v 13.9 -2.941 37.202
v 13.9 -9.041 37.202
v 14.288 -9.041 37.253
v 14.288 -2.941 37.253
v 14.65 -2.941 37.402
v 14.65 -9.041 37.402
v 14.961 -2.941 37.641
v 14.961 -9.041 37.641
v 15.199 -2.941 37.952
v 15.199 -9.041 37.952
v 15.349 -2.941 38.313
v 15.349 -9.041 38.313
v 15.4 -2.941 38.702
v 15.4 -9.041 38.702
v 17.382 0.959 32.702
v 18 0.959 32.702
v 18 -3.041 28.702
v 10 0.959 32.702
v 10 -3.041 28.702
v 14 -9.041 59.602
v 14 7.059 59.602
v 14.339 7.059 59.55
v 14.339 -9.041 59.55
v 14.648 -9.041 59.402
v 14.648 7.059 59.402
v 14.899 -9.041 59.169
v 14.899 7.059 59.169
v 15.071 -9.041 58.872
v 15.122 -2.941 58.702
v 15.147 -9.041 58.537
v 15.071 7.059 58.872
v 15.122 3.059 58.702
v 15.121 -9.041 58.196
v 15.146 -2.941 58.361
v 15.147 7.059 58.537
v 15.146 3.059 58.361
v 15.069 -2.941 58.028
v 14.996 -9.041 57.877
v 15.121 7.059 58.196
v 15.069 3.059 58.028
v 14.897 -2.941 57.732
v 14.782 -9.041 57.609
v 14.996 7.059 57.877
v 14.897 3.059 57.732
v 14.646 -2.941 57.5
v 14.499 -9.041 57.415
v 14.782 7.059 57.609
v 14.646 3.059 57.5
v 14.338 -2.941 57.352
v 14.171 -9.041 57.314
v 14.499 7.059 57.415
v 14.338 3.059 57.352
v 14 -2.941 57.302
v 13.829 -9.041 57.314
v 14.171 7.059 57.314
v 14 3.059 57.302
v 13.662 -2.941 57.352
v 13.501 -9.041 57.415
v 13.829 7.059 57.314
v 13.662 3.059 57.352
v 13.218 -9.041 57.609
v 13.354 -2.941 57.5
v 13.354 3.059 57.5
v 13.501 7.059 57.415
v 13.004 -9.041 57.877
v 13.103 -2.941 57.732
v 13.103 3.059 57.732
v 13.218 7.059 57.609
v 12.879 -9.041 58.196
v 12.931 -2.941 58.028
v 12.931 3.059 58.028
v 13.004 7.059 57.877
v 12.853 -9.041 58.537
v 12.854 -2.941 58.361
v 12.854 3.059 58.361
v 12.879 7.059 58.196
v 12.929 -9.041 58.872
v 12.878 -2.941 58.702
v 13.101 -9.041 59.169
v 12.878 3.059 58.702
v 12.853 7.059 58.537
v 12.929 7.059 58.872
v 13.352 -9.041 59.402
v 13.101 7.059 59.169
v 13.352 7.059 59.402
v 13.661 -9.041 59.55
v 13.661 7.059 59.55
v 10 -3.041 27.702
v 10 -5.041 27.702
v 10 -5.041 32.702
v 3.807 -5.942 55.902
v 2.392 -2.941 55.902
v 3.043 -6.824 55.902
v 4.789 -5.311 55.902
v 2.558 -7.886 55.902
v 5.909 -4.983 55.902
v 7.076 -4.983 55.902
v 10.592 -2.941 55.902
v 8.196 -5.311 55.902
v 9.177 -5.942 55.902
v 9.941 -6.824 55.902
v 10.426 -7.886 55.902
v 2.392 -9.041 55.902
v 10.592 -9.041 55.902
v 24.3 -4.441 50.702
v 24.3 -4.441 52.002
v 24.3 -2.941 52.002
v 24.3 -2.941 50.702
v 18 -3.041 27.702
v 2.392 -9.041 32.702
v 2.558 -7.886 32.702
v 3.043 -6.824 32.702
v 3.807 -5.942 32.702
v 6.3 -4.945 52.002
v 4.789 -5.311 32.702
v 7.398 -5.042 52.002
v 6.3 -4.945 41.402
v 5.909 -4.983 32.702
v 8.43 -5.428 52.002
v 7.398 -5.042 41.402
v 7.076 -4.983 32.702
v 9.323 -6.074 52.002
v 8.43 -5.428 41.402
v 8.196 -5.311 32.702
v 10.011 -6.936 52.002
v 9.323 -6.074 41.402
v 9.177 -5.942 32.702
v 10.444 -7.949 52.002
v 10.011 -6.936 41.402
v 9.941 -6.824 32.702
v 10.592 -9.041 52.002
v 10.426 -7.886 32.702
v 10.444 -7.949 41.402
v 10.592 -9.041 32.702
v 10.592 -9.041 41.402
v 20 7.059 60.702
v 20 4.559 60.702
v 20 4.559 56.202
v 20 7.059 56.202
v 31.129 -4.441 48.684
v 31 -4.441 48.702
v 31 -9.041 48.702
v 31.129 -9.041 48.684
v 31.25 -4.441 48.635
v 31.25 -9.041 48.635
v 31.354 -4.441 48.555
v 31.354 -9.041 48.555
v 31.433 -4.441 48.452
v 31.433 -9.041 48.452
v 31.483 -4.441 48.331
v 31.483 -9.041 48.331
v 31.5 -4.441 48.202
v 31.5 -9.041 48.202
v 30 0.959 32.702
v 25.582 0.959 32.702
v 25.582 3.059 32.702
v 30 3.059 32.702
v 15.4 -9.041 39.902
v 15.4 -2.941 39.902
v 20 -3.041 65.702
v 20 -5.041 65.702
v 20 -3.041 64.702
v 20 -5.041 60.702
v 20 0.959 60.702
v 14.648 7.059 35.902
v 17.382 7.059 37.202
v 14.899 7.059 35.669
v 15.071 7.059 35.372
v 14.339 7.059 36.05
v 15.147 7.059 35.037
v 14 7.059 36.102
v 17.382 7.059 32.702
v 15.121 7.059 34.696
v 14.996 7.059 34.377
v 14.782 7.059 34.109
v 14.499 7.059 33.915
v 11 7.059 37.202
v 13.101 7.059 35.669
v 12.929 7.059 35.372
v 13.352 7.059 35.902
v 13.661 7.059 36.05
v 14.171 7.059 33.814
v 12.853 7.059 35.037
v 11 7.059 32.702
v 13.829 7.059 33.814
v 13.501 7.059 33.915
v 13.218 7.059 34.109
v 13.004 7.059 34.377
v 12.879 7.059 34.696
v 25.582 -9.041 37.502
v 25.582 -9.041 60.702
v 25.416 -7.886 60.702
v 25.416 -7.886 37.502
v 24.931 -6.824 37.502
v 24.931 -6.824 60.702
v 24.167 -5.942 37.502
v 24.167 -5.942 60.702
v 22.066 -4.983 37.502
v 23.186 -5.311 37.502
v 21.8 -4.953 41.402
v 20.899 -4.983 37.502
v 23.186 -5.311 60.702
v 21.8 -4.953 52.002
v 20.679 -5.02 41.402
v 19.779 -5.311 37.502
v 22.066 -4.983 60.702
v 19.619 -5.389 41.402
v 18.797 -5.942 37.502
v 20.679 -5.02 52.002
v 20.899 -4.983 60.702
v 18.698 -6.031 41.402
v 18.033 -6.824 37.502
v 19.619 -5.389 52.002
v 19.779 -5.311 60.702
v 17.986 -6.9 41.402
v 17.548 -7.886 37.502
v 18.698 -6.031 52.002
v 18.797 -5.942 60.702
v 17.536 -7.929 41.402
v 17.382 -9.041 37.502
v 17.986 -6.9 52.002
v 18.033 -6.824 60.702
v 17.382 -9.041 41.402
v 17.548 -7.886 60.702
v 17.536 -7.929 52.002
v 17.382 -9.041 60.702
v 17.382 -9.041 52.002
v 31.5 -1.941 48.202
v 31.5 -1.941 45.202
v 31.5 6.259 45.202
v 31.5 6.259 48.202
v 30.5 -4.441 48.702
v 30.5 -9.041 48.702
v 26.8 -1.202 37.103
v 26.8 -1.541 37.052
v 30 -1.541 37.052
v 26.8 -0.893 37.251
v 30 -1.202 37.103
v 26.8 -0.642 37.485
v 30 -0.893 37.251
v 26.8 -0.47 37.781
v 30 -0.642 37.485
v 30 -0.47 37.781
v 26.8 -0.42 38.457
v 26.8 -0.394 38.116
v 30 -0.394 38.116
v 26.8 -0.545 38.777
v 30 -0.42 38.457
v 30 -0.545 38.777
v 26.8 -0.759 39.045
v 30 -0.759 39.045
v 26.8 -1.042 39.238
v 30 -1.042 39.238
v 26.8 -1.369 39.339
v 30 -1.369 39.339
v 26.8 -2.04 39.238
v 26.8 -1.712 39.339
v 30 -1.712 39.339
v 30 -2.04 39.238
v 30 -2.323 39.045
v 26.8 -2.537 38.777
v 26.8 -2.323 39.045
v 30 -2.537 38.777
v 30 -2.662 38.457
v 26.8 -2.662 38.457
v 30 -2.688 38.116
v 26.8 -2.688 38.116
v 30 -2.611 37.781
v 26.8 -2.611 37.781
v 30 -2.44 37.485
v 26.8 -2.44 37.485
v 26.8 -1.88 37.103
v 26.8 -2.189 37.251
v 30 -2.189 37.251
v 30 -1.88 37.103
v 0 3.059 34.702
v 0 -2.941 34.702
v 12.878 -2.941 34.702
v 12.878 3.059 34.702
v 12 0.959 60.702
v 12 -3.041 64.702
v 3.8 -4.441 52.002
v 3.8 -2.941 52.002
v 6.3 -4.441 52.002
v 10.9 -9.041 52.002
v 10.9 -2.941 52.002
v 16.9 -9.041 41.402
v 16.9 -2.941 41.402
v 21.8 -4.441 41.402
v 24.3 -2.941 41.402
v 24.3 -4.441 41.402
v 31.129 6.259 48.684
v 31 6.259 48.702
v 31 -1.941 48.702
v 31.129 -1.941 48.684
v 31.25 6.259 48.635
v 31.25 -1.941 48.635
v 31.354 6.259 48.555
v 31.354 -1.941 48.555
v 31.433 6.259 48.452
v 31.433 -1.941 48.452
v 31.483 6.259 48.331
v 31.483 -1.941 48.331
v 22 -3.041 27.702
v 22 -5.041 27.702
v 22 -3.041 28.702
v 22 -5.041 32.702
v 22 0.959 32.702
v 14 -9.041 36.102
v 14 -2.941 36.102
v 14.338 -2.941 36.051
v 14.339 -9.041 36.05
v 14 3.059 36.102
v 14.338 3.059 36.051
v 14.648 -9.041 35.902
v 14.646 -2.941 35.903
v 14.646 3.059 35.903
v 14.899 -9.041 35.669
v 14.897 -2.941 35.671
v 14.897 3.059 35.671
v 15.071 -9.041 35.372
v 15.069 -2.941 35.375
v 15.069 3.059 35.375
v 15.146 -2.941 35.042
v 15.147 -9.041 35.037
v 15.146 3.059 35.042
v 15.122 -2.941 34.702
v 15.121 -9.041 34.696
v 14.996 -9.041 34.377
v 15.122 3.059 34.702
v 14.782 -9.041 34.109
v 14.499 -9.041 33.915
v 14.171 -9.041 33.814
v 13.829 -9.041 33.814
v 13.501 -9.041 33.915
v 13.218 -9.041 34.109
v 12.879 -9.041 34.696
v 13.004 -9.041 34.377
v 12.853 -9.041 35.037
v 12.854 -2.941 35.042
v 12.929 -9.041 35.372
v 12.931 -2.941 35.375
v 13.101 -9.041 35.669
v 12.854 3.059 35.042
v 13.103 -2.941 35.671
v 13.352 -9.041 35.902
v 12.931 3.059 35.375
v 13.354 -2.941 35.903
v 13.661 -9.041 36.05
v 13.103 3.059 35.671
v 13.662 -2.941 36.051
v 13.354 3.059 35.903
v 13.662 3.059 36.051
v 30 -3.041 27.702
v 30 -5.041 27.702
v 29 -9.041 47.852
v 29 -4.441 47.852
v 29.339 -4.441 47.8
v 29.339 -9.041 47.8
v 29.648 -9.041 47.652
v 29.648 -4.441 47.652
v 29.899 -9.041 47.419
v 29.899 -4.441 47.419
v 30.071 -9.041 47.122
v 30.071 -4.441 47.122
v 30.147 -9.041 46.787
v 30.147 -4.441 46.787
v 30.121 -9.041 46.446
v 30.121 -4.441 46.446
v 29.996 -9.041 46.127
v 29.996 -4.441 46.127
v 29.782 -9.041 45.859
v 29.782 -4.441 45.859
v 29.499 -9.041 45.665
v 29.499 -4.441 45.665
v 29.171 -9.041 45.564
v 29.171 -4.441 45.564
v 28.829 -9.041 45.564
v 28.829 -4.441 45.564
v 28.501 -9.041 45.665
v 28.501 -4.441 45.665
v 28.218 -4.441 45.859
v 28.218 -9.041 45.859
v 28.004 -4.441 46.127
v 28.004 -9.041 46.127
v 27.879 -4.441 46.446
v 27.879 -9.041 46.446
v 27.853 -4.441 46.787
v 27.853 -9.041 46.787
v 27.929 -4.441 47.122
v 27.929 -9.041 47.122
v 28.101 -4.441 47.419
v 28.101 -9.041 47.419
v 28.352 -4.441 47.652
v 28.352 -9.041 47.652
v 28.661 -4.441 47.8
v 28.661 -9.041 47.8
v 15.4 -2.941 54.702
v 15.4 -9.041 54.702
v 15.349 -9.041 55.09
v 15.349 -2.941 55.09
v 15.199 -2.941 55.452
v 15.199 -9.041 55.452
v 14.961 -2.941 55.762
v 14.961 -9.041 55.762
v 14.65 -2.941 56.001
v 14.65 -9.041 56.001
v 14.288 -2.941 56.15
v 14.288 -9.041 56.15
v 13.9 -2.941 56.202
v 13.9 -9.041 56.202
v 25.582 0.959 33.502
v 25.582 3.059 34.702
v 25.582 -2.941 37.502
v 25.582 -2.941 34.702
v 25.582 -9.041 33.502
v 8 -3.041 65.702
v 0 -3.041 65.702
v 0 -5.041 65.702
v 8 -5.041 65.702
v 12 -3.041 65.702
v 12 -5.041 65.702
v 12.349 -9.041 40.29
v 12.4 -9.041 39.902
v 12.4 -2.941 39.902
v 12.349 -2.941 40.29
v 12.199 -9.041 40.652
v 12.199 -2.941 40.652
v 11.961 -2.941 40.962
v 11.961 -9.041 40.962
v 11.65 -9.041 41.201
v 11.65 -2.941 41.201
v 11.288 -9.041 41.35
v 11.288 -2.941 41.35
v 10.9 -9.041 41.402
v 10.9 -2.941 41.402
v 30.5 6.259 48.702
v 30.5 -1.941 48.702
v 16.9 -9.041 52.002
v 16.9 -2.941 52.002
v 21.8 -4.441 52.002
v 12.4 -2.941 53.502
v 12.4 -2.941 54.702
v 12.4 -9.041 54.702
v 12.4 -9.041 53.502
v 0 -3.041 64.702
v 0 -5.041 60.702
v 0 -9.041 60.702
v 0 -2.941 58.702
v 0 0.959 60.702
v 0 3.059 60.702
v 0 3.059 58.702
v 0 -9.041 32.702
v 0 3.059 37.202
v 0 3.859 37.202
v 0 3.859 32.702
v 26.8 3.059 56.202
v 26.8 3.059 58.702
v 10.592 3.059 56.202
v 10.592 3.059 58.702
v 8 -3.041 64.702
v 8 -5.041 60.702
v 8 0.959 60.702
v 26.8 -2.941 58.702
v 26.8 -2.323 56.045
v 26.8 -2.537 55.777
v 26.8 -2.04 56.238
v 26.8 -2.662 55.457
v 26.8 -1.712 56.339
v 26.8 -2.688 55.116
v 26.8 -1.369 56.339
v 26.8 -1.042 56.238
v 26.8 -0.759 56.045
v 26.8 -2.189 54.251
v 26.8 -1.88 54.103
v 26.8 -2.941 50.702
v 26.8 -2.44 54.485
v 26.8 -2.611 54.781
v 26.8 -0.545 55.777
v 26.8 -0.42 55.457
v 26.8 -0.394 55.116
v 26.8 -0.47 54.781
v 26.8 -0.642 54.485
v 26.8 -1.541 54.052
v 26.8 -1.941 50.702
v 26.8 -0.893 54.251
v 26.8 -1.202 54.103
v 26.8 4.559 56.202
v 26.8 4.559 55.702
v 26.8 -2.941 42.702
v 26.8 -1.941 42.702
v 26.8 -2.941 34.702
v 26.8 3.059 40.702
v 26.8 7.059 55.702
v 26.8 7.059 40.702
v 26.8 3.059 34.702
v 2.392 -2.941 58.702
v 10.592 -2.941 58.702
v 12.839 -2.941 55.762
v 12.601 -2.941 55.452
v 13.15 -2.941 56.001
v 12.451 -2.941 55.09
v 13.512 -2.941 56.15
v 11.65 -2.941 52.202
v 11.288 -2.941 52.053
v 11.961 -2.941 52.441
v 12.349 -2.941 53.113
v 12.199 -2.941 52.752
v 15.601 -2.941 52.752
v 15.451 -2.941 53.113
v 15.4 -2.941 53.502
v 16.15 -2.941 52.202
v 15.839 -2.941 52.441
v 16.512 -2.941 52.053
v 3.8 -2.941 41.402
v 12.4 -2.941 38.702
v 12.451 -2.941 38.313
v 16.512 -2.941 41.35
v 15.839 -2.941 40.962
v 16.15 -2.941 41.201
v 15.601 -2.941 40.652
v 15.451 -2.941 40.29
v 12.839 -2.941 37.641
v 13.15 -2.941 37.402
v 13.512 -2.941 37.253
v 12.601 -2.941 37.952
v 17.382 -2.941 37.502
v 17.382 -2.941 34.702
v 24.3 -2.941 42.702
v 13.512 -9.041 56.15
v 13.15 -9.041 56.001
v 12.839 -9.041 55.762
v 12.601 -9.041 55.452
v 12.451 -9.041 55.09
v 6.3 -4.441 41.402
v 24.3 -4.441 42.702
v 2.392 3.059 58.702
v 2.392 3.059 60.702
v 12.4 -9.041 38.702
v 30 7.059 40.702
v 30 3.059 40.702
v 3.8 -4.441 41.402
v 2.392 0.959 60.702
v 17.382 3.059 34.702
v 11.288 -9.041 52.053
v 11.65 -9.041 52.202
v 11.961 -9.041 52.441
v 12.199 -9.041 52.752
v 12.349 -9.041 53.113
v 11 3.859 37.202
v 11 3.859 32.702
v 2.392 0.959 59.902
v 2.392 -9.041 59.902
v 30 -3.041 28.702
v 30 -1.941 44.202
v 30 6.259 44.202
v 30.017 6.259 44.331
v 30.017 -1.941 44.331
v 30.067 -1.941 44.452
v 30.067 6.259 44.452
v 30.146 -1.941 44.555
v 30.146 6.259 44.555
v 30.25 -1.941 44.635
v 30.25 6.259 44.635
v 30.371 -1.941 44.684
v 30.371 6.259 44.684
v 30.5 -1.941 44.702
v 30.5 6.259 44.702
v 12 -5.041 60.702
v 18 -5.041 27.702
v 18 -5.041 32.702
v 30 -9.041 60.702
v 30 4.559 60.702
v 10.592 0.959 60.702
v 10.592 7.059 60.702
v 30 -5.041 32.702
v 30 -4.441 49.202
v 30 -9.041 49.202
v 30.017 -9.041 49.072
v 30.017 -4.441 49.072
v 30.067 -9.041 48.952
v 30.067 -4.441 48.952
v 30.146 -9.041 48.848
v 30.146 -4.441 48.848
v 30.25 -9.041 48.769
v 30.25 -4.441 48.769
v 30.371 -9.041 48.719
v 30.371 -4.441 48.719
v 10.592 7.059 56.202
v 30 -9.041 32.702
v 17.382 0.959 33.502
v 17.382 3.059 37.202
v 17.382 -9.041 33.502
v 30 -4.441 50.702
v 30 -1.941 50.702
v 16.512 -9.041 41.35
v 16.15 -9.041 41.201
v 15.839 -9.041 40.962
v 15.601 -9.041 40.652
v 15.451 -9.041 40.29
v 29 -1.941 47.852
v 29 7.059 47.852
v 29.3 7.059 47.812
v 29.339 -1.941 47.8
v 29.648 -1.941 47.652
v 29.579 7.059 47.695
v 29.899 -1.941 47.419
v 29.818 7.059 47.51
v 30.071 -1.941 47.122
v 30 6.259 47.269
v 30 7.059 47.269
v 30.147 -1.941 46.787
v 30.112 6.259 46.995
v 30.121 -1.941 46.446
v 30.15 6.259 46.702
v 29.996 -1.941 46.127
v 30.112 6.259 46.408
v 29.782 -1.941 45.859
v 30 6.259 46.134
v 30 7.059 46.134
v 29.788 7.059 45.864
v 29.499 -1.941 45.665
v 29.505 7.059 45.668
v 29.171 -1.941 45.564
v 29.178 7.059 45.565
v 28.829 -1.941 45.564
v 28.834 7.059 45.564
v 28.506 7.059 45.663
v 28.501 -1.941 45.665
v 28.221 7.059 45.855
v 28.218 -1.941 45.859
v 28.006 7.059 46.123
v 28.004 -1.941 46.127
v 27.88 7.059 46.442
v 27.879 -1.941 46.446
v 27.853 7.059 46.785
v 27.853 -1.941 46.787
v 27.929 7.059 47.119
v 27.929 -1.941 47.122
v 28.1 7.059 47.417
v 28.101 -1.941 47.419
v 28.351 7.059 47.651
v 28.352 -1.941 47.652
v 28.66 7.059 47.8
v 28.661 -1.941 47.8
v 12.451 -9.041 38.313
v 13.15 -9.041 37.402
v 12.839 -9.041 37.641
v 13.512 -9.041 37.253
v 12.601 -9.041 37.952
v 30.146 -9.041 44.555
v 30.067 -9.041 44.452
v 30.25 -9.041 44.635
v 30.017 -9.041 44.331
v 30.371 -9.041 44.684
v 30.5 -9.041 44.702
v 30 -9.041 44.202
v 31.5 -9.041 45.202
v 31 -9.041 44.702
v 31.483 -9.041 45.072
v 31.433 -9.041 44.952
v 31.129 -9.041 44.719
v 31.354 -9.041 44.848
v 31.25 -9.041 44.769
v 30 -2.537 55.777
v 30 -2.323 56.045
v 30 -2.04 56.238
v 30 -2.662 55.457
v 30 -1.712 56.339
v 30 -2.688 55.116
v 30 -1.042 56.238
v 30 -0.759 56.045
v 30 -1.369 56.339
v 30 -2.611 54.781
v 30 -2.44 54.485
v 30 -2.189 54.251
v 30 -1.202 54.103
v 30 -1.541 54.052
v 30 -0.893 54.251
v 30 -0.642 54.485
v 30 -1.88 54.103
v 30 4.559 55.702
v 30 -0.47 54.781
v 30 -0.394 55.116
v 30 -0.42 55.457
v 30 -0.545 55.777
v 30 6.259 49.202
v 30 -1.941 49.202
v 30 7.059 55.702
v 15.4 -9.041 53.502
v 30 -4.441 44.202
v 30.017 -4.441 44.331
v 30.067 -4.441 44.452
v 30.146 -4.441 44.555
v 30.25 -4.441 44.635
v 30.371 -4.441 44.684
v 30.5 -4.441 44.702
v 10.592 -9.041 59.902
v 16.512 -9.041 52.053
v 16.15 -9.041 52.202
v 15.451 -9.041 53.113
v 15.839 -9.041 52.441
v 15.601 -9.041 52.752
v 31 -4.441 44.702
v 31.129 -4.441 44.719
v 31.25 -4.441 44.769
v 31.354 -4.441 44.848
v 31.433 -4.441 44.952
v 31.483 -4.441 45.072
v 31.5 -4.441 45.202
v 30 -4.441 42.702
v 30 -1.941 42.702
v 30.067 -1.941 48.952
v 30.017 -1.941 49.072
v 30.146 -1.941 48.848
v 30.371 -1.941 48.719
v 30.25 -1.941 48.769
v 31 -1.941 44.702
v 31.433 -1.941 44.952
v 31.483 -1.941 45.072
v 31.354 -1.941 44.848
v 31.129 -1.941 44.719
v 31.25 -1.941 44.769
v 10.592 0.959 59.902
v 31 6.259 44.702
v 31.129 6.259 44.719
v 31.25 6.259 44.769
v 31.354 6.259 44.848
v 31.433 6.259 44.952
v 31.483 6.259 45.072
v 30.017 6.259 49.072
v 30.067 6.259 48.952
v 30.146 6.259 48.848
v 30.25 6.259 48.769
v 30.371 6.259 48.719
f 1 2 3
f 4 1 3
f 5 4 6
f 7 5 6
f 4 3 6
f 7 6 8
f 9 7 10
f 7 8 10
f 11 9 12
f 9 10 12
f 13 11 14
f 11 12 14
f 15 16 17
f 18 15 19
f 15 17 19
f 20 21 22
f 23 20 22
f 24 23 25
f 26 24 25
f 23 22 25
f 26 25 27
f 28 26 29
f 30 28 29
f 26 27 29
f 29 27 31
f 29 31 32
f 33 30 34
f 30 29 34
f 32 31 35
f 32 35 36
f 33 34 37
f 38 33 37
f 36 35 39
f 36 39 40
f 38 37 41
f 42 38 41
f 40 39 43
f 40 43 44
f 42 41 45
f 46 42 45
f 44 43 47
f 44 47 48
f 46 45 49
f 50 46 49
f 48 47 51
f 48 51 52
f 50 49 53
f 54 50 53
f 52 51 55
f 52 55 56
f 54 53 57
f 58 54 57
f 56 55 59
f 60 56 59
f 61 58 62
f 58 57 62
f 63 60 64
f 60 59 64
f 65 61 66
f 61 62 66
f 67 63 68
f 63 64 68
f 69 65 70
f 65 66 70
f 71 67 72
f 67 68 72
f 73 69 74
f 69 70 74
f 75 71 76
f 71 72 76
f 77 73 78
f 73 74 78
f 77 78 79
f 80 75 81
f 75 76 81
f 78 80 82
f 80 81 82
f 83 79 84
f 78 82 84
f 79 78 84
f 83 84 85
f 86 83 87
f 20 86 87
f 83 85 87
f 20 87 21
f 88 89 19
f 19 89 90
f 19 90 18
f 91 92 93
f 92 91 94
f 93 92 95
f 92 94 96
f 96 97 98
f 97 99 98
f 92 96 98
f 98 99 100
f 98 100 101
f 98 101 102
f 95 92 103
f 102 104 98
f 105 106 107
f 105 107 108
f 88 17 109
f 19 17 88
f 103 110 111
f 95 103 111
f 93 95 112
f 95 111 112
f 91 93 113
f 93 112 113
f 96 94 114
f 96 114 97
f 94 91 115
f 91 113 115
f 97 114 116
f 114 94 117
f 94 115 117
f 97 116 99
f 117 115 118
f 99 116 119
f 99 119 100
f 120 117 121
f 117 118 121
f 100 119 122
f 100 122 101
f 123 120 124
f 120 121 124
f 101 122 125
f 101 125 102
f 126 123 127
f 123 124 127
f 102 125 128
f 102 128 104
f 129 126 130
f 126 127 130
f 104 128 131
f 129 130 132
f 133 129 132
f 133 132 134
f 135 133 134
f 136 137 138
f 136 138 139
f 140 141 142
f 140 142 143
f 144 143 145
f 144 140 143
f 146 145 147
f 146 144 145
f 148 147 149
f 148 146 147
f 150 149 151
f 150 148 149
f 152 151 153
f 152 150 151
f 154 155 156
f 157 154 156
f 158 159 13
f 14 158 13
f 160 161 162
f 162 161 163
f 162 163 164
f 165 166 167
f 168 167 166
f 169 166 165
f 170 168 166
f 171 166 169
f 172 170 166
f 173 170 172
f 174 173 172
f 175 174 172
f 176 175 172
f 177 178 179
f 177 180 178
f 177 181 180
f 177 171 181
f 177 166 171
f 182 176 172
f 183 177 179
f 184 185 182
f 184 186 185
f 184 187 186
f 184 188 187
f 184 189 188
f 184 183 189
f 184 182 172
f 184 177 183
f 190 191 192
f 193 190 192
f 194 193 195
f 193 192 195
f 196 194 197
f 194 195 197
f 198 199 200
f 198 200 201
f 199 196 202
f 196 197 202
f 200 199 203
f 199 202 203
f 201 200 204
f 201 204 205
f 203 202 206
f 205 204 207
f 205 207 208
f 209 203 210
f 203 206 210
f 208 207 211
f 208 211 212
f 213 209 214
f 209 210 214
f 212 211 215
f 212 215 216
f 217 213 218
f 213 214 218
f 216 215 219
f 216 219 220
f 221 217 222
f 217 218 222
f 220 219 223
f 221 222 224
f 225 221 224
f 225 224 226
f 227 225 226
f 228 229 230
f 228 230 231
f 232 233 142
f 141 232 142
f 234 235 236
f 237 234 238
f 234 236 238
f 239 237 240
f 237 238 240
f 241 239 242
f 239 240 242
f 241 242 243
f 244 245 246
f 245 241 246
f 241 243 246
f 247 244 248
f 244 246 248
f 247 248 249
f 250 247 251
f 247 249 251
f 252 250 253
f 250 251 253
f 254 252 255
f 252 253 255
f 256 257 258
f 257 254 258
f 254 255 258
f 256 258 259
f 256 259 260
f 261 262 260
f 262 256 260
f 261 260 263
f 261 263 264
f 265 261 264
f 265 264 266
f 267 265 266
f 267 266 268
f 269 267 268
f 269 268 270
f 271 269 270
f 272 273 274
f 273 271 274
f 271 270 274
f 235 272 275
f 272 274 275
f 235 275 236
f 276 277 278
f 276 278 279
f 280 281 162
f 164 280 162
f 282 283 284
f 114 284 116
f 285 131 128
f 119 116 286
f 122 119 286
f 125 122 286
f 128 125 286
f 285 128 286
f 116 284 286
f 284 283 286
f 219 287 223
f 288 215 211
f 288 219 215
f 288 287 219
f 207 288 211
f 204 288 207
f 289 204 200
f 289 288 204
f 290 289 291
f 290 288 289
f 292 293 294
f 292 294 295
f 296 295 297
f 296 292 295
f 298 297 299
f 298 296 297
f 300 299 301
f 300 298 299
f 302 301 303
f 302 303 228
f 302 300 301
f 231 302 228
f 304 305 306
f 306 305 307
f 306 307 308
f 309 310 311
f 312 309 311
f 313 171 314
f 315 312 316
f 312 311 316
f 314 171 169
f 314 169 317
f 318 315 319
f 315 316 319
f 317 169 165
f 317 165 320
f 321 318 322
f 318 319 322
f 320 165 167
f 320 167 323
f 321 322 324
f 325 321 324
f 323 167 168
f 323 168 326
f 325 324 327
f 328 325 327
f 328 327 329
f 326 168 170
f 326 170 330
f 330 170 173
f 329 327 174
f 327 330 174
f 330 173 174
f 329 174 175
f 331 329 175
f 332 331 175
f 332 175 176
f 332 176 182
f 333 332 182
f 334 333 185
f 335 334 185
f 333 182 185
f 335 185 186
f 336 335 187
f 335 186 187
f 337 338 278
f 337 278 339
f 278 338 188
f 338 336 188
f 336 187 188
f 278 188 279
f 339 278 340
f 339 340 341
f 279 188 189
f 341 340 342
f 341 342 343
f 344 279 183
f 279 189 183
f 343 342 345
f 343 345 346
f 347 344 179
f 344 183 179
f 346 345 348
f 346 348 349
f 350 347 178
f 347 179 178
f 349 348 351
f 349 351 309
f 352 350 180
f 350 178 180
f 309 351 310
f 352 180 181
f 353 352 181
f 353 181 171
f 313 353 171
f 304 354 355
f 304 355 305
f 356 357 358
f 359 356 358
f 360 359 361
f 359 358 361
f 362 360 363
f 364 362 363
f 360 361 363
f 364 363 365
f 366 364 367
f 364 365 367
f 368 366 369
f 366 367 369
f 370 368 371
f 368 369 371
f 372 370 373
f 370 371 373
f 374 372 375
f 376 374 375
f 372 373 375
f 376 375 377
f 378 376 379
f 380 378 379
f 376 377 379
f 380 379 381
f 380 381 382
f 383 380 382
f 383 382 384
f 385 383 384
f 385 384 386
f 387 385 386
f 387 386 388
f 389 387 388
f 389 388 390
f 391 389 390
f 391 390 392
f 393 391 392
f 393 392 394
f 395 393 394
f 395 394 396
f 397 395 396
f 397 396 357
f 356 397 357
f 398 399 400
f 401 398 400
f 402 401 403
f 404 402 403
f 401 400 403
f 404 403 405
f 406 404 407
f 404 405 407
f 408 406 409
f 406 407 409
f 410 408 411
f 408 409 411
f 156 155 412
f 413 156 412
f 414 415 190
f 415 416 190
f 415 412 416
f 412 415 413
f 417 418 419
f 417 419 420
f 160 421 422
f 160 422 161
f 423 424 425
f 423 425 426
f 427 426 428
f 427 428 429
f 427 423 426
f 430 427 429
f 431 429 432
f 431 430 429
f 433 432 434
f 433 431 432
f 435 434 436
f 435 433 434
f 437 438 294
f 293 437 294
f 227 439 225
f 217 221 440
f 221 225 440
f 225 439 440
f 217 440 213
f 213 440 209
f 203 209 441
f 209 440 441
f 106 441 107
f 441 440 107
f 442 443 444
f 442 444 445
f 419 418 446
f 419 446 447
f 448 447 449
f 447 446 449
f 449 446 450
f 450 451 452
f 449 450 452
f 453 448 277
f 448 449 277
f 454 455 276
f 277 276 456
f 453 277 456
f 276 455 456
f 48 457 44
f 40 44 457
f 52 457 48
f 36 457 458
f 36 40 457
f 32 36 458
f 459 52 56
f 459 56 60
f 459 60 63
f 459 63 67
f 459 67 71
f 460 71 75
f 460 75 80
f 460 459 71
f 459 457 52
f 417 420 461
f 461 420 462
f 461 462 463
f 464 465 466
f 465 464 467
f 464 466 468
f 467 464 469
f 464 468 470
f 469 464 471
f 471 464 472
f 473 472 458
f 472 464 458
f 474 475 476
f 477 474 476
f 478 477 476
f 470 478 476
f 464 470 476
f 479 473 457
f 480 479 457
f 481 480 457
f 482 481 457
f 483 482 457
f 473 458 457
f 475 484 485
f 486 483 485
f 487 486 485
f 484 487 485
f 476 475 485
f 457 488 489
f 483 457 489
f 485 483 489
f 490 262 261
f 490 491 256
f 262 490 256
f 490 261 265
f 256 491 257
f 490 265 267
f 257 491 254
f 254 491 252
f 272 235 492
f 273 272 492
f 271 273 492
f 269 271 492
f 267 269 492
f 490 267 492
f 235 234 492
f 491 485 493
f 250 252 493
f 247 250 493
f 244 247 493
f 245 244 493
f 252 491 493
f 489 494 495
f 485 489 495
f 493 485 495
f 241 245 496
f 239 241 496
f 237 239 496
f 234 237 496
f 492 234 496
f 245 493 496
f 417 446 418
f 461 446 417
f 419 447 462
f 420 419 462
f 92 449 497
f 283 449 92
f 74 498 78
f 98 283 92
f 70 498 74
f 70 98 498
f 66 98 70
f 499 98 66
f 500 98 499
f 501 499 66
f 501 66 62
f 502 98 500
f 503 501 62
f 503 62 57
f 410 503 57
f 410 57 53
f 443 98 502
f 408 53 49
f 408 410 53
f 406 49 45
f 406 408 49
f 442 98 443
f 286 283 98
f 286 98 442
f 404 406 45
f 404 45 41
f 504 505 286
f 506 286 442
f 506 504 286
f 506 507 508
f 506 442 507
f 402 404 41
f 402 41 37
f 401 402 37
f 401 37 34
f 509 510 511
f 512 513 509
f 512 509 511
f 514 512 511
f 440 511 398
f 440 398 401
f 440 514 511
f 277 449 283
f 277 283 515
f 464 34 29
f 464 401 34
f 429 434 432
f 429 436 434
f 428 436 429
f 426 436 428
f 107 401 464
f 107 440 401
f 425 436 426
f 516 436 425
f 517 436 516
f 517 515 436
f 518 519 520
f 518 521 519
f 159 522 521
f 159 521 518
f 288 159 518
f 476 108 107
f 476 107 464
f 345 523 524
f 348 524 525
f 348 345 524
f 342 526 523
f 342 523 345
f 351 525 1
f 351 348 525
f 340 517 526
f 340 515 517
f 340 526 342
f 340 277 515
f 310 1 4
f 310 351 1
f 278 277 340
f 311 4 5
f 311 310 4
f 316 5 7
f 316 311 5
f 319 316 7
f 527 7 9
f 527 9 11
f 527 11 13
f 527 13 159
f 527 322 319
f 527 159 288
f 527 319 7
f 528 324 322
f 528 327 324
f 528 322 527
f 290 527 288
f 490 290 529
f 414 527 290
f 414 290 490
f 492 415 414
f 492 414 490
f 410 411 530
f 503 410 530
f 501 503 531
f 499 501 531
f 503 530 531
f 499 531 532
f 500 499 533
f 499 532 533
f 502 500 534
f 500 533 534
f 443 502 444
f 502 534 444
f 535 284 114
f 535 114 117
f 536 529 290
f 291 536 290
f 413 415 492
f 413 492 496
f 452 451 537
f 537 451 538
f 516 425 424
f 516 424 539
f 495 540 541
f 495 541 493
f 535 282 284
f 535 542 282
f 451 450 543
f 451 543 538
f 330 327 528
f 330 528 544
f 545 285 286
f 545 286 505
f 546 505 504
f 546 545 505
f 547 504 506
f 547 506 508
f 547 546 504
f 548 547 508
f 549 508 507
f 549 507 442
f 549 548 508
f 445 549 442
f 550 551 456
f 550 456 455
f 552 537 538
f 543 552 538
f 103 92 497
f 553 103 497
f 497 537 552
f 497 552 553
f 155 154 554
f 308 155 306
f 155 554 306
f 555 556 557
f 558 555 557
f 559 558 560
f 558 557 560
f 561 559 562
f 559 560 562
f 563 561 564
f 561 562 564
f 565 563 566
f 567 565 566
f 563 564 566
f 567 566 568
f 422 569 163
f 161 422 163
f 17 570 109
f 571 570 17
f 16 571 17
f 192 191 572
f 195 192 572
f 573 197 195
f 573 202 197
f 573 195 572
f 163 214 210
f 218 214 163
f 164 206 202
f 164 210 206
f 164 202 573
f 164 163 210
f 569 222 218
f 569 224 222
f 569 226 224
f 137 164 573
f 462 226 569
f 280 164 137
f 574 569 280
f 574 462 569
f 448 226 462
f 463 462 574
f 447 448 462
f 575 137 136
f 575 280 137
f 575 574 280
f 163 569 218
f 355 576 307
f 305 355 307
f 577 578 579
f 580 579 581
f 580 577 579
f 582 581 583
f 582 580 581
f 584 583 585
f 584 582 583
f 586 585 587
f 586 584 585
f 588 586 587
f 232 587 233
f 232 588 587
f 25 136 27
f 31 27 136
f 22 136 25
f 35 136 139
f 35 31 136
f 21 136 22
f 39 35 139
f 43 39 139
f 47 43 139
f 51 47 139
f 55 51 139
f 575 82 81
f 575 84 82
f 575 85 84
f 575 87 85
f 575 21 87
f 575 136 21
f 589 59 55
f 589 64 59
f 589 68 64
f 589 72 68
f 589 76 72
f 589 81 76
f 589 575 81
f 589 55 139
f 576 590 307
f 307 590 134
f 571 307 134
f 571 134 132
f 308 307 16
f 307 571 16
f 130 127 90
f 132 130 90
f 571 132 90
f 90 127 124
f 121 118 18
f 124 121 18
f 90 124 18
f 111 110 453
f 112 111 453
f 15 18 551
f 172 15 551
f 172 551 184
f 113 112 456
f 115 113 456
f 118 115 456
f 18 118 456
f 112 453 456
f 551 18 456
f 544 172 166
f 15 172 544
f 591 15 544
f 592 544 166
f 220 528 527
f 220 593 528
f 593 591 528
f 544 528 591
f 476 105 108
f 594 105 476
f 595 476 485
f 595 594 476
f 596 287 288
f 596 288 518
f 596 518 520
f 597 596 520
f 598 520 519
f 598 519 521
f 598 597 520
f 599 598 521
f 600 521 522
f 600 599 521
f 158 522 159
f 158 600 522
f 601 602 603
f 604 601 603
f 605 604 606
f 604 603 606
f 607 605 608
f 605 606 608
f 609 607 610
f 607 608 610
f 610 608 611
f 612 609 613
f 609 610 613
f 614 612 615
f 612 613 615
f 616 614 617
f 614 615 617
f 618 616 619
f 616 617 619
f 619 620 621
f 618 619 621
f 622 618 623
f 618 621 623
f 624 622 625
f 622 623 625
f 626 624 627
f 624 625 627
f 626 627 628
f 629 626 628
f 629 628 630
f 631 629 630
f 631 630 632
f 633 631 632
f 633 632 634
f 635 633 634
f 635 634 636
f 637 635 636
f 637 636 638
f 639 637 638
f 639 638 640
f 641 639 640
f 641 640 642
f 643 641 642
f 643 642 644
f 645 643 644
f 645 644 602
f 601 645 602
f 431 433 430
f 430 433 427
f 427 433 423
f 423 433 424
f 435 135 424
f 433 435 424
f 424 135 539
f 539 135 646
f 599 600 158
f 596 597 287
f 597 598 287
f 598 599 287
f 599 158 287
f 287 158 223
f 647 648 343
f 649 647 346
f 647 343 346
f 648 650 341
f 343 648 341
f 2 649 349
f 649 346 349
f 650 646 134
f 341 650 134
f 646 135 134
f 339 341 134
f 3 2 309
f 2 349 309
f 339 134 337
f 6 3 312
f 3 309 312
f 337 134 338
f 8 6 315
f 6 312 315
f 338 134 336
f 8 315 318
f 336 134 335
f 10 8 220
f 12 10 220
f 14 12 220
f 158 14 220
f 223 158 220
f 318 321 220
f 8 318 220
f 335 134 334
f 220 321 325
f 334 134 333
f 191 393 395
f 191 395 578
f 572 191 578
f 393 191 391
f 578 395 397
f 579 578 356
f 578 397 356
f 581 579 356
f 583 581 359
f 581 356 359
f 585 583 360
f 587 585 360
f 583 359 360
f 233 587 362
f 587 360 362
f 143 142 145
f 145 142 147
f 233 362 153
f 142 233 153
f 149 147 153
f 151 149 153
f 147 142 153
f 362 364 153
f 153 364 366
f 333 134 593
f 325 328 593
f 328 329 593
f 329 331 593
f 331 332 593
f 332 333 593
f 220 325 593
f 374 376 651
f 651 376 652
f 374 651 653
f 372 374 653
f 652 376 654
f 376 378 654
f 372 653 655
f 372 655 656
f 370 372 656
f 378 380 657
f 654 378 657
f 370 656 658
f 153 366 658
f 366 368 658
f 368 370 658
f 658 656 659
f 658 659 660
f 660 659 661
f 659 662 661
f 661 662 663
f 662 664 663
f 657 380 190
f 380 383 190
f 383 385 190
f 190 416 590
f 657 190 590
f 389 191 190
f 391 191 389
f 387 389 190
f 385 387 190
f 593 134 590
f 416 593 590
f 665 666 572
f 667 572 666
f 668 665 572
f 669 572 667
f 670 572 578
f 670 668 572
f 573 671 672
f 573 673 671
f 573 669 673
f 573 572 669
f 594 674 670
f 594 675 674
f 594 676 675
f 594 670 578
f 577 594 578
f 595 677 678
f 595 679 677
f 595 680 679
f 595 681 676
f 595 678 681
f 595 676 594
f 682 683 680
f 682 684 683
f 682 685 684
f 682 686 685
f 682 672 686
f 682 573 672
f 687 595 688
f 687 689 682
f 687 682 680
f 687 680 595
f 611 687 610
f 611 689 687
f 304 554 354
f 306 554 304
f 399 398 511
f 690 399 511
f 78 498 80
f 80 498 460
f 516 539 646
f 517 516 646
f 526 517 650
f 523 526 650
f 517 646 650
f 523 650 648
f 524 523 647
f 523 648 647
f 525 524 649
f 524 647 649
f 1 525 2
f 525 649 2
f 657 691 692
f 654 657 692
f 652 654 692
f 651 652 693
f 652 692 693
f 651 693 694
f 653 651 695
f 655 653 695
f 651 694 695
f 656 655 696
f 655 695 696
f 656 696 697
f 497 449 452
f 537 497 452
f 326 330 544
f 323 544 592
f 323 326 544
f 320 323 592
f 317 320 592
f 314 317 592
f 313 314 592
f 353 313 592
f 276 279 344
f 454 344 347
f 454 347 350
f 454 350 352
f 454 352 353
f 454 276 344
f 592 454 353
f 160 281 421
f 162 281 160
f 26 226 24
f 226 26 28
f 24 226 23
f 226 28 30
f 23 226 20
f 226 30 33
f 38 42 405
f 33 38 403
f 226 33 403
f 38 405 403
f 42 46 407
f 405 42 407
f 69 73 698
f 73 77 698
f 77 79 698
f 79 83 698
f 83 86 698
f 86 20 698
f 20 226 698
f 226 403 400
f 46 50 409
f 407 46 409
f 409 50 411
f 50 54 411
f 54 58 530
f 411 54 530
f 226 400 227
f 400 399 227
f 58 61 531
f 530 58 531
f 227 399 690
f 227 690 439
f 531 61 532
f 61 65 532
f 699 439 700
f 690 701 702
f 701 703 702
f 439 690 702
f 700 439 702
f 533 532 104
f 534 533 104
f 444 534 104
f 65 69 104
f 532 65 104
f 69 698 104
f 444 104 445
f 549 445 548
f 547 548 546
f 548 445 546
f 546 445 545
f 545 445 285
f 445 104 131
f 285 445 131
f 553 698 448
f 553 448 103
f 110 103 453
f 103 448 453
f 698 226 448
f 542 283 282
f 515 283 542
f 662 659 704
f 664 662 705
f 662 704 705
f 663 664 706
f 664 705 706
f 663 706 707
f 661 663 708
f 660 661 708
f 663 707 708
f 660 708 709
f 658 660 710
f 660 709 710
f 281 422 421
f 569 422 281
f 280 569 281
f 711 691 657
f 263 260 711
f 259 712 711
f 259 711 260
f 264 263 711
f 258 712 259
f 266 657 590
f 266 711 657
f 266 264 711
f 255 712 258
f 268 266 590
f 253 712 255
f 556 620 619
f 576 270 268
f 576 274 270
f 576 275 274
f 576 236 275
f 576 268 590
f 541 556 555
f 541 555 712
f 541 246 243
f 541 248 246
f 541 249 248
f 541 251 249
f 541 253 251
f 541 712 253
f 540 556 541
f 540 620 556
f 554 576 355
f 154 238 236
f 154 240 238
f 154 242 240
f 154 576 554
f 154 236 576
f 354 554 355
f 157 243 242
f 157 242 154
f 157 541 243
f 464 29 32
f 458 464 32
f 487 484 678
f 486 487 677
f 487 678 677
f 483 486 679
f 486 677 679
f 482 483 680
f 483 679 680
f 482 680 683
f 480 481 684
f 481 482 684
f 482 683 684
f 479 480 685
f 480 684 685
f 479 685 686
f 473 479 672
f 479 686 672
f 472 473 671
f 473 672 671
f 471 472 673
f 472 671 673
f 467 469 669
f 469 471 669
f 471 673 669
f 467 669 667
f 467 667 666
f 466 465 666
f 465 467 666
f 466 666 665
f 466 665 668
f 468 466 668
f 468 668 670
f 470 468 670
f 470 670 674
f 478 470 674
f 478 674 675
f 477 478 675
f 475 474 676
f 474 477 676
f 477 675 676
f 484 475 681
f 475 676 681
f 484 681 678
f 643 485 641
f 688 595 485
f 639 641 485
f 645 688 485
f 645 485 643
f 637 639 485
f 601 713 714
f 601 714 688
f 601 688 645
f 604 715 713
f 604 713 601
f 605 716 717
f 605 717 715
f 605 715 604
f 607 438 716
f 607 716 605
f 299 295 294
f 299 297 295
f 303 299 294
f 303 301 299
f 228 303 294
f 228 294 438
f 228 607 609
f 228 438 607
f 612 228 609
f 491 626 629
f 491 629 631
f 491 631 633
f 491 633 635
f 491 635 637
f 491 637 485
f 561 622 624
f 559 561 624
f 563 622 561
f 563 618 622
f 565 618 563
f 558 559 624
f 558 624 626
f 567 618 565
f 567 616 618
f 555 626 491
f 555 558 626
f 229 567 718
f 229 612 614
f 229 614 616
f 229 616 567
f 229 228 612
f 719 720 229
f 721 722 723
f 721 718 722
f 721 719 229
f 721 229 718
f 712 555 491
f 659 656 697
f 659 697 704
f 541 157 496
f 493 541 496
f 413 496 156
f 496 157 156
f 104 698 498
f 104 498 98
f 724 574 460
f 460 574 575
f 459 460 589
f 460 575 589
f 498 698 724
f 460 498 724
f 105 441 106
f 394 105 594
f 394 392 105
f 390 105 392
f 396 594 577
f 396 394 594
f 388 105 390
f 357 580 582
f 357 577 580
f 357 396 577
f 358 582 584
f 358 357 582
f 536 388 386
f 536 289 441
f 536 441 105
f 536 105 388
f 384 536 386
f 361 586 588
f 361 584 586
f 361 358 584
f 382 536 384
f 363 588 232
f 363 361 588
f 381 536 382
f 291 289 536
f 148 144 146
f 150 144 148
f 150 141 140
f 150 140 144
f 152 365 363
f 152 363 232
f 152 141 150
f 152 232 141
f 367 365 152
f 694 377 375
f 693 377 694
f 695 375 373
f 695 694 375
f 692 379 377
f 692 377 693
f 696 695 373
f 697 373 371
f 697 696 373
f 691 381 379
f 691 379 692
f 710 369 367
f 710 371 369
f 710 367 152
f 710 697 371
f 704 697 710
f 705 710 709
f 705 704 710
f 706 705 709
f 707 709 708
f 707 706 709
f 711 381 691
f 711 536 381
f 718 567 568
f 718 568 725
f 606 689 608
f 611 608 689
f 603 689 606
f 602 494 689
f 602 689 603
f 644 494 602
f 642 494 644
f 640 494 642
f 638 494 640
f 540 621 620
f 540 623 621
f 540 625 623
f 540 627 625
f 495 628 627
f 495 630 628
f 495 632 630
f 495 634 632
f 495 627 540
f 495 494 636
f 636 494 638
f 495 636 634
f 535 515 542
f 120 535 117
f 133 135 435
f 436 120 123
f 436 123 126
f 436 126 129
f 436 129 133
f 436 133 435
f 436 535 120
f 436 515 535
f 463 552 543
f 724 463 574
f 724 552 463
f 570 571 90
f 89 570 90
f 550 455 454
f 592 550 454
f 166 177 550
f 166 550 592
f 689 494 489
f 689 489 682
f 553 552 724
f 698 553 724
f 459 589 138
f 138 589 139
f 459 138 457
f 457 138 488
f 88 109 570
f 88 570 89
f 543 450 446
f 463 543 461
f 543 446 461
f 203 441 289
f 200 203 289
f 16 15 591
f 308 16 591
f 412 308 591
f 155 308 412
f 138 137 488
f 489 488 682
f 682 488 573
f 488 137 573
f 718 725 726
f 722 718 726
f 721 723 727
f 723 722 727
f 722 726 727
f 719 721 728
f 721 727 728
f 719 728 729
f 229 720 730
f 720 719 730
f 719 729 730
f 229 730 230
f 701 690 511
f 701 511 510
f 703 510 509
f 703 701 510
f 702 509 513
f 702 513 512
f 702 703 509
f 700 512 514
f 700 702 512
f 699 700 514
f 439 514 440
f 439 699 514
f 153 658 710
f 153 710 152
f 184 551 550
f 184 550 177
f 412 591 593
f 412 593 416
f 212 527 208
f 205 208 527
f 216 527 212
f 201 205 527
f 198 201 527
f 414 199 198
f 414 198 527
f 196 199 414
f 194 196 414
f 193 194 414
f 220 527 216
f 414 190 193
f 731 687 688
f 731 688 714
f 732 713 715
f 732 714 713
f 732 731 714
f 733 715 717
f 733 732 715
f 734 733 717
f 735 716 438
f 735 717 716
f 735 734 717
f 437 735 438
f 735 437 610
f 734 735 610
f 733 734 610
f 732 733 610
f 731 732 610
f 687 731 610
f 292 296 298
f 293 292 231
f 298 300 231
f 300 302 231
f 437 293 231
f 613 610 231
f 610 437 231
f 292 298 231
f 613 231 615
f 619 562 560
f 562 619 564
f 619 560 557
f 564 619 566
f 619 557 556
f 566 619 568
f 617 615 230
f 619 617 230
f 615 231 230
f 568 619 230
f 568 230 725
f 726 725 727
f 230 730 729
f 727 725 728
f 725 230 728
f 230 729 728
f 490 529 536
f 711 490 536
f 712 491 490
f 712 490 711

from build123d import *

# Parameters (mm, degrees)
SKETCH1_W           = 28
SKETCH1_H           = 16.1
BOSS_EXTRUDE1_DEPTH = 30
SKETCH2_W           = 10
SKETCH2_H           = 2.5
CUT_EXTRUDE1_DEPTH  = 5
SKETCH3_W           = 10
SKETCH3_H           = 4
CUT_EXTRUDE2_DEPTH  = 8
SKETCH4_W           = 10
SKETCH4_H           = 3.2
CUT_EXTRUDE3_DEPTH  = 8
SKETCH5_W           = 11
SKETCH5_H           = 4
CUT_EXTRUDE4_DEPTH  = 8
SKETCH6_W           = 20
SKETCH6_H           = 2
BOSS_EXTRUDE2_DEPTH = 5
CHAMFER1_SIZE       = 4
SKETCH7_W           = 20
SKETCH7_H           = 2
BOSS_EXTRUDE3_DEPTH = 5
CHAMFER2_SIZE       = 4
SKETCH9_W           = 25.8
SKETCH9_H           = 19
CUT_EXTRUDE6_DEPTH  = 10
SKETCH13_R          = 4.1
CUT_EXTRUDE10_DEPTH = 27.2
SKETCH14_R          = 4.1
CUT_EXTRUDE11_DEPTH = 27.2
SKETCH15_W          = 8.2
SKETCH15_H          = 4
CUT_EXTRUDE12_DEPTH = 27.2
SKETCH16_W          = 0.59230819
SKETCH16_H          = 0.8
SKETCH16_W_2        = 1.617695922
CUT_EXTRUDE13_DEPTH = 4
SKETCH17_W          = 1.5
SKETCH17_H          = 4
BOSS_EXTRUDE4_DEPTH = 16.1
FILLET1_R           = 0.5
SKETCH18_R          = 3.5
CUT_EXTRUDE14_DEPTH = 6.1
SKETCH19_W          = 8
SKETCH19_H          = 1
CUT_EXTRUDE15_DEPTH = 10
SKETCH20_W          = 20.5
SKETCH20_H          = 10.6
CUT_EXTRUDE16_DEPTH = 1.5
SKETCH21_W          = 5.7
SKETCH21_H          = 8
CUT_EXTRUDE17_DEPTH = 1.5
SKETCH22_W          = 8
SKETCH22_H          = 2.5
CUT_EXTRUDE18_DEPTH = 1.5
SKETCH23_R          = 1.15
CUT_EXTRUDE19_DEPTH = 75.620049118
SKETCH24_W          = 8.2
SKETCH24_H          = 0.8
CUT_EXTRUDE20_DEPTH = 2.1
CUT_EXTRUDE21_REACH = 75.421
SKETCH25_W          = 7.929527271
SKETCH25_H          = 0.8
CUT_EXTRUDE22_START = -5
SKETCH26_W          = 4
SKETCH26_H          = 6
CUT_EXTRUDE22_DEPTH = 5
CUT_EXTRUDE23_START = -5
SKETCH27_W          = 4
SKETCH27_H          = 6
CUT_EXTRUDE23_DEPTH = 5
SKETCH28_R          = 1.15
CUT_EXTRUDE24_DEPTH = 3.2
CUT_EXTRUDE25_REACH = 75.764
SKETCH29_W          = 15.5
SKETCH29_H          = 10.6
CUT_EXTRUDE27_REACH = 75.421
SKETCH30_W          = 24
SKETCH30_H          = 6
CUT_EXTRUDE29_DEPTH = 1
SKETCH33_W          = 3
SKETCH33_H          = 4.2
CUT_EXTRUDE30_DEPTH = 6.1
FILLET2_START       = -9.040821865
FILLET2_DEPTH       = 6.1
FILLET2_2_DEPTH     = 6.1


with BuildPart() as part:
    # Sketch1 → Boss-Extrude1 (new body)
    with BuildSketch(Plane(origin=(0, 0, 0), x_dir=(0, 0, -1), z_dir=(1, 0, 0))):
        with Locations((-46.701535197, -0.990821865)):
            Rectangle(SKETCH1_W, SKETCH1_H)
    extrude(amount=BOSS_EXTRUDE1_DEPTH)

    # Sketch2 → Cut-Extrude1 (cut)
    with BuildSketch(Plane.XY.offset(60.701535197)):
        with Locations((25, 5.809178135)):
            Rectangle(SKETCH2_W, SKETCH2_H)
    extrude(amount=-CUT_EXTRUDE1_DEPTH, mode=Mode.SUBTRACT)

    # Sketch3 → Cut-Extrude2 (cut)
    with BuildSketch(Plane.XY.offset(60.701535197)):
        with Locations((5, 5.059178135)):
            Rectangle(SKETCH3_W, SKETCH3_H)
    extrude(amount=-CUT_EXTRUDE2_DEPTH, mode=Mode.SUBTRACT)

    # Sketch4 → Cut-Extrude3 (cut)
    with BuildSketch(Plane(origin=(0, 0, 32.701535197), x_dir=(-1, 0, 0), z_dir=(0, 0, -1))):
        with Locations((-6, 5.459178135)):
            Rectangle(SKETCH4_W, SKETCH4_H)
    extrude(amount=-CUT_EXTRUDE3_DEPTH, mode=Mode.SUBTRACT)

    # Sketch5 → Cut-Extrude4 (cut)
    with BuildSketch(Plane(origin=(0, 0, 32.701535197), x_dir=(-1, 0, 0), z_dir=(0, 0, -1))):
        with Locations((-24.5, 5.059178135)):
            Rectangle(SKETCH5_W, SKETCH5_H)
    extrude(amount=-CUT_EXTRUDE4_DEPTH, mode=Mode.SUBTRACT)

    # Sketch6 → Boss-Extrude2 (add)
    with BuildSketch(Plane(origin=(0, 0, 32.701535197), x_dir=(-1, 0, 0), z_dir=(0, 0, -1))):
        with Locations((-20, -4.040821865)):
            Rectangle(SKETCH6_W, SKETCH6_H)
    extrude(amount=BOSS_EXTRUDE2_DEPTH)

    # Chamfer1
    chamfer1_edges = [part.edges().sort_by_distance(p)[0] for p in [
        (20, -3.040821865, 32.701535197),
    ]]
    chamfer(chamfer1_edges, length=CHAMFER1_SIZE)

    # Sketch7 → Boss-Extrude3 (add)
    with BuildSketch(Plane.XY.offset(60.701535197)):
        with Locations((10, -4.040821865)):
            Rectangle(SKETCH7_W, SKETCH7_H)
    extrude(amount=BOSS_EXTRUDE3_DEPTH)

    # Chamfer2
    chamfer2_edges = [part.edges().sort_by_distance(p)[0] for p in [
        (10, -3.040821865, 60.701535197),
    ]]
    chamfer(chamfer2_edges, length=CHAMFER2_SIZE)

    # Sketch9 → Cut-Extrude6 (cut)
    with BuildSketch(Plane(origin=(0, 7.059178135, 0), x_dir=(1, 0, 0), z_dir=(0, 1, 0))):
        with Locations((13.9, -46.701535197)):
            Rectangle(SKETCH9_W, SKETCH9_H)
    extrude(amount=-CUT_EXTRUDE6_DEPTH, mode=Mode.SUBTRACT)

    # Sketch13 → Cut-Extrude10 (cut)
    with BuildSketch(Plane.XY.offset(60.701535197)):
        with Locations((21.482304078, -9.040821865)):
            Circle(SKETCH13_R)
    extrude(amount=-CUT_EXTRUDE10_DEPTH, mode=Mode.SUBTRACT)

    # Sketch14 → Cut-Extrude11 (cut)
    with BuildSketch(Plane(origin=(0, 0, 32.701535197), x_dir=(-1, 0, 0), z_dir=(0, 0, -1))):
        with Locations((-6.49230819, -9.040821865)):
            Circle(SKETCH14_R)
    extrude(amount=-CUT_EXTRUDE11_DEPTH, mode=Mode.SUBTRACT)

    # Sketch15 → Cut-Extrude12 (cut)
    with BuildSketch(Plane.XZ.offset(9.040821865)):
        with Locations((6.49230819, 57.901535197)):
            Rectangle(SKETCH15_W, SKETCH15_H)
        with Locations((21.482304078, 35.501535197)):
            Rectangle(SKETCH15_W, SKETCH15_H)
    extrude(amount=-CUT_EXTRUDE12_DEPTH, mode=Mode.SUBTRACT)

    # Sketch16 → Cut-Extrude13 (cut)
    with BuildSketch(Plane(origin=(0, 7.059178135, 0), x_dir=(1, 0, 0), z_dir=(0, 1, 0))):
        with Locations((10.296154095, -60.301535197)):
            Rectangle(SKETCH16_W, SKETCH16_H)
        with Locations((18.191152039, -33.101535197)):
            Rectangle(SKETCH16_W_2, SKETCH16_H)
    extrude(amount=-CUT_EXTRUDE13_DEPTH, mode=Mode.SUBTRACT)

    # Sketch17 → Boss-Extrude4 (add)
    with BuildSketch(Plane.XZ.offset(9.040821865)):
        with Locations((30.75, 46.701535197)):
            Rectangle(SKETCH17_W, SKETCH17_H)
    extrude(amount=-BOSS_EXTRUDE4_DEPTH)

    # Fillet1
    fillet1_edges = [part.edges().sort_by_distance(p)[0] for p in [
        (30, -0.990821865, 44.701535197),
        (30, -0.990821865, 48.701535197),
        (31.5, -0.990821865, 48.701535197),
        (31.5, -0.990821865, 44.701535197),
    ]]
    fillet(fillet1_edges, radius=FILLET1_R)

    # Sketch18 → Cut-Extrude14 (cut)
    with BuildSketch(Plane.XZ.offset(9.040821865)):
        with Locations(Location((13.985, 46.701535197, 0), (0, 0, 194.224464848))):
            Circle(SKETCH18_R)
    extrude(amount=-CUT_EXTRUDE14_DEPTH, mode=Mode.SUBTRACT)

    # Sketch19 → Cut-Extrude15 (cut)
    with BuildSketch(Plane(origin=(31.5, 0, 0), x_dir=(0, 0, -1), z_dir=(1, 0, 0))):
        with Locations((-46.701535197, -2.440821865)):
            Rectangle(SKETCH19_W, SKETCH19_H)
    extrude(amount=-CUT_EXTRUDE15_DEPTH, mode=Mode.SUBTRACT)

    # Sketch20 → Cut-Extrude16 (cut)
    with BuildSketch(Plane(origin=(0, -2.940821865, 0), x_dir=(1, 0, 0), z_dir=(0, 1, 0))):
        with Locations((14.05, -46.701535197)):
            Rectangle(SKETCH20_W, SKETCH20_H)
    extrude(amount=-CUT_EXTRUDE16_DEPTH, mode=Mode.SUBTRACT)

    # Sketch21 → Cut-Extrude17 (cut)
    with BuildSketch(Plane(origin=(0, -2.940821865, 0), x_dir=(1, 0, 0), z_dir=(0, 1, 0))):
        with Locations((27.15, -46.701535197)):
            Rectangle(SKETCH21_W, SKETCH21_H)
    extrude(amount=-CUT_EXTRUDE17_DEPTH, mode=Mode.SUBTRACT)

    # Sketch22 → Cut-Extrude18 (cut)
    with BuildSketch(Plane(origin=(31.5, 0, 0), x_dir=(0, 0, -1), z_dir=(1, 0, 0))):
        with Locations((-46.701535197, -3.190821865)):
            Rectangle(SKETCH22_W, SKETCH22_H)
    extrude(amount=-CUT_EXTRUDE18_DEPTH, mode=Mode.SUBTRACT)

    # Sketch23 → Cut-Extrude19 (cut, through all)
    with BuildSketch(Plane(origin=(0, 7.059178135, 0), x_dir=(1, 0, 0), z_dir=(0, 1, 0))):
        with Locations(Location((29, -46.701535197, 0), (0, 0, 270))):
            Circle(SKETCH23_R)
        with Locations(Location((14, -34.951535197, 0), (0, 0, 270))):
            Circle(SKETCH23_R)
        with Locations(Location((14, -58.451535197, 0), (0, 0, 270))):
            Circle(SKETCH23_R)
    extrude(amount=-CUT_EXTRUDE19_DEPTH, mode=Mode.SUBTRACT)

    # Sketch24 → Cut-Extrude20 (cut)
    with BuildSketch(Plane(origin=(0, 3.059178135, 0), x_dir=(1, 0, 0), z_dir=(0, 1, 0))):
        with Locations((21.482304078, -33.101535197)):
            Rectangle(SKETCH24_W, SKETCH24_H)
        with Locations((6.49230819, -60.301535197)):
            Rectangle(SKETCH24_W, SKETCH24_H)
    extrude(amount=-CUT_EXTRUDE20_DEPTH, mode=Mode.SUBTRACT)

    # Cut-Extrude21: up to this face of the body (flat: up to its plane)
    cut_extrude21_end = Plane(part.part.faces().sort_by_distance((30, -1.445232759, 54.822020691))[0])
    # Sketch25 → Cut-Extrude21 (cut, up to the picked face)
    with BuildSketch(Plane(origin=(31.5, 0, 0), x_dir=(0, 0, -1), z_dir=(1, 0, 0)), mode=Mode.PRIVATE) as cut_extrude21_sk1:
        with Locations((-46.553400254, 6.659178135)):
            Rectangle(SKETCH25_W, SKETCH25_H)
    cut_extrude21_tool1 = split(extrude(cut_extrude21_sk1.sketch, amount=-CUT_EXTRUDE21_REACH, mode=Mode.PRIVATE), bisect_by=cut_extrude21_end, keep=Keep.BOTH, mode=Mode.PRIVATE)
    add(cut_extrude21_tool1.solids().sort_by(Axis((31.5, 6.659178, 46.5534), (-1, 0, 0)))[0], mode=Mode.SUBTRACT)

    # Sketch26 → Cut-Extrude22 (cut)
    with BuildSketch(Plane.XY.offset(65.701535197).offset(CUT_EXTRUDE22_START)):
        with Locations((10, -2.040821865)):
            Rectangle(SKETCH26_W, SKETCH26_H)
    extrude(amount=CUT_EXTRUDE22_DEPTH, mode=Mode.SUBTRACT)

    # Sketch27 → Cut-Extrude23 (cut)
    with BuildSketch(Plane(origin=(0, 0, 27.701535197), x_dir=(-1, 0, 0), z_dir=(0, 0, -1)).offset(CUT_EXTRUDE23_START)):
        with Locations((-20, -2.040821865)):
            Rectangle(SKETCH27_W, SKETCH27_H)
    extrude(amount=CUT_EXTRUDE23_DEPTH, mode=Mode.SUBTRACT)

    # Sketch28 → Cut-Extrude24 (cut)
    with BuildSketch(Plane(origin=(30, 0, 0), x_dir=(0, 0, -1), z_dir=(1, 0, 0))):
        with Locations((-55.201535197, -1.540821865)):
            Circle(SKETCH28_R)
        with Locations((-38.201535197, -1.540821865)):
            Circle(SKETCH28_R)
    extrude(amount=-CUT_EXTRUDE24_DEPTH, mode=Mode.SUBTRACT)

    # Cut-Extrude25: up to this face of the body (flat: up to its plane)
    cut_extrude25_end = Plane(part.part.faces().sort_by_distance((10.921875254, -9.040821865, 51.731547487))[0])
    # Sketch29 → Cut-Extrude25 (cut, up to the picked face)
    with BuildSketch(Plane(origin=(0, -4.440821865, 0), x_dir=(1, 0, 0), z_dir=(0, 1, 0)), mode=Mode.PRIVATE) as cut_extrude25_sk1:
        with Locations((14.05, -46.701535197)):
            Rectangle(SKETCH29_W, SKETCH29_H)
    cut_extrude25_tool1 = split(extrude(cut_extrude25_sk1.sketch, amount=-CUT_EXTRUDE25_REACH, mode=Mode.PRIVATE), bisect_by=cut_extrude25_end, keep=Keep.BOTH, mode=Mode.PRIVATE)
    add(cut_extrude25_tool1.solids().sort_by(Axis((14.05, -4.440822, 46.701535), (0, -1, 0)))[0], mode=Mode.SUBTRACT)

    # Cut-Extrude27: up to this face of the body (flat: up to its plane)
    cut_extrude27_end = Plane(part.part.faces().sort_by_distance((26.8, 2.175126911, 47.312469979))[0])
    # Sketch30 → Cut-Extrude27 (cut, up to the picked face)
    with BuildSketch(Plane.ZY, mode=Mode.PRIVATE) as cut_extrude27_sk1:
        with Locations((46.701535197, 0.059178135)):
            Rectangle(SKETCH30_W, SKETCH30_H)
    cut_extrude27_tool1 = split(extrude(cut_extrude27_sk1.sketch, amount=-CUT_EXTRUDE27_REACH, mode=Mode.PRIVATE), bisect_by=cut_extrude27_end, keep=Keep.BOTH, mode=Mode.PRIVATE)
    add(cut_extrude27_tool1.solids().sort_by(Axis((0, 0.059178, 46.701535), (1, 0, 0)))[0], mode=Mode.SUBTRACT)

    # Sketch32 → Cut-Extrude29 (cut)
    with BuildSketch(Plane(origin=(1, 0, 0), x_dir=(0, 0, -1), z_dir=(1, 0, 0))):
        Polygon((-32.701535197, 3.859178135), (-37.201535197, 3.859178135), (-37.201535197, 3.059178135), (-52.701535197, 3.059178135), (-52.701535197, 7.059178135), (-32.701535197, 7.059178135), align=None)
    extrude(amount=-CUT_EXTRUDE29_DEPTH, mode=Mode.SUBTRACT)

    # Sketch33 → Cut-Extrude30 (cut)
    with BuildSketch(Plane(origin=(0, -2.940821865, 0), x_dir=(1, 0, 0), z_dir=(0, 1, 0))):
        with Locations((13.9, -39.301535197)):
            Rectangle(SKETCH33_W, SKETCH33_H)
        with Locations((13.9, -54.101535197)):
            Rectangle(SKETCH33_W, SKETCH33_H)
    extrude(amount=-CUT_EXTRUDE30_DEPTH, mode=Mode.SUBTRACT)

    # Fillet2: read off the stored shape, not the designer's step
    # Fillet2 outline → Fillet2 (cut)
    with BuildSketch(Plane(origin=(0, 0, 0), x_dir=(1, 0, 0), z_dir=(0, 1, 0)).offset(FILLET2_START)):
        with BuildLine():
            ThreePointArc((16.9, -41.401535197), (15.839339828, -40.962195368), (15.4, -39.901535197))
            Line((15.4, -39.901535197), (15.4, -41.401535197))
            Line((15.4, -41.401535197), (16.9, -41.401535197))
        make_face()
        with BuildLine():
            Line((12.4, -41.401535197), (12.4, -39.901535197))
            ThreePointArc((12.4, -39.901535197), (11.960660172, -40.962195369), (10.9, -41.401535197))
            Line((10.9, -41.401535197), (12.4, -41.401535197))
        make_face()
        with BuildLine():
            ThreePointArc((10.9, -52.001535197), (11.960660172, -52.440875025), (12.4, -53.501535197))
            Line((12.4, -53.501535197), (12.4, -52.001535197))
            Line((12.4, -52.001535197), (10.9, -52.001535197))
        make_face()
        with BuildLine():
            Line((15.4, -52.001535197), (15.4, -53.501535197))
            ThreePointArc((15.4, -53.501535197), (15.839339828, -52.440875025), (16.9, -52.001535197))
            Line((16.9, -52.001535197), (15.4, -52.001535197))
        make_face()
    extrude(amount=FILLET2_DEPTH, mode=Mode.SUBTRACT)

    # Fillet2 2 outline → Fillet2 2 (add)
    with BuildSketch(Plane(origin=(0, 0, 0), x_dir=(1, 0, 0), z_dir=(0, 1, 0)).offset(FILLET2_START)):
        with BuildLine():
            ThreePointArc((12.4, -38.701535197), (12.839339828, -37.640875025), (13.9, -37.201535197))
            Line((13.9, -37.201535197), (12.4, -37.201535197))
            Line((12.4, -37.201535197), (12.4, -38.701535197))
        make_face()
        with BuildLine():
            ThreePointArc((13.9, -37.201535197), (14.960660172, -37.640875025), (15.4, -38.701535197))
            Line((15.4, -38.701535197), (15.4, -37.201535197))
            Line((15.4, -37.201535197), (13.9, -37.201535197))
        make_face()
        with BuildLine():
            ThreePointArc((15.4, -54.701535197), (14.960660172, -55.762195369), (13.9, -56.201535197))
            Line((13.9, -56.201535197), (15.4, -56.201535197))
            Line((15.4, -56.201535197), (15.4, -54.701535197))
        make_face()
        with BuildLine():
            ThreePointArc((13.9, -56.201535197), (12.839339828, -55.762195369), (12.4, -54.701535197))
            Line((12.4, -54.701535197), (12.4, -56.201535197))
            Line((12.4, -56.201535197), (13.9, -56.201535197))
        make_face()
    extrude(amount=FILLET2_2_DEPTH)


solid = part.part
